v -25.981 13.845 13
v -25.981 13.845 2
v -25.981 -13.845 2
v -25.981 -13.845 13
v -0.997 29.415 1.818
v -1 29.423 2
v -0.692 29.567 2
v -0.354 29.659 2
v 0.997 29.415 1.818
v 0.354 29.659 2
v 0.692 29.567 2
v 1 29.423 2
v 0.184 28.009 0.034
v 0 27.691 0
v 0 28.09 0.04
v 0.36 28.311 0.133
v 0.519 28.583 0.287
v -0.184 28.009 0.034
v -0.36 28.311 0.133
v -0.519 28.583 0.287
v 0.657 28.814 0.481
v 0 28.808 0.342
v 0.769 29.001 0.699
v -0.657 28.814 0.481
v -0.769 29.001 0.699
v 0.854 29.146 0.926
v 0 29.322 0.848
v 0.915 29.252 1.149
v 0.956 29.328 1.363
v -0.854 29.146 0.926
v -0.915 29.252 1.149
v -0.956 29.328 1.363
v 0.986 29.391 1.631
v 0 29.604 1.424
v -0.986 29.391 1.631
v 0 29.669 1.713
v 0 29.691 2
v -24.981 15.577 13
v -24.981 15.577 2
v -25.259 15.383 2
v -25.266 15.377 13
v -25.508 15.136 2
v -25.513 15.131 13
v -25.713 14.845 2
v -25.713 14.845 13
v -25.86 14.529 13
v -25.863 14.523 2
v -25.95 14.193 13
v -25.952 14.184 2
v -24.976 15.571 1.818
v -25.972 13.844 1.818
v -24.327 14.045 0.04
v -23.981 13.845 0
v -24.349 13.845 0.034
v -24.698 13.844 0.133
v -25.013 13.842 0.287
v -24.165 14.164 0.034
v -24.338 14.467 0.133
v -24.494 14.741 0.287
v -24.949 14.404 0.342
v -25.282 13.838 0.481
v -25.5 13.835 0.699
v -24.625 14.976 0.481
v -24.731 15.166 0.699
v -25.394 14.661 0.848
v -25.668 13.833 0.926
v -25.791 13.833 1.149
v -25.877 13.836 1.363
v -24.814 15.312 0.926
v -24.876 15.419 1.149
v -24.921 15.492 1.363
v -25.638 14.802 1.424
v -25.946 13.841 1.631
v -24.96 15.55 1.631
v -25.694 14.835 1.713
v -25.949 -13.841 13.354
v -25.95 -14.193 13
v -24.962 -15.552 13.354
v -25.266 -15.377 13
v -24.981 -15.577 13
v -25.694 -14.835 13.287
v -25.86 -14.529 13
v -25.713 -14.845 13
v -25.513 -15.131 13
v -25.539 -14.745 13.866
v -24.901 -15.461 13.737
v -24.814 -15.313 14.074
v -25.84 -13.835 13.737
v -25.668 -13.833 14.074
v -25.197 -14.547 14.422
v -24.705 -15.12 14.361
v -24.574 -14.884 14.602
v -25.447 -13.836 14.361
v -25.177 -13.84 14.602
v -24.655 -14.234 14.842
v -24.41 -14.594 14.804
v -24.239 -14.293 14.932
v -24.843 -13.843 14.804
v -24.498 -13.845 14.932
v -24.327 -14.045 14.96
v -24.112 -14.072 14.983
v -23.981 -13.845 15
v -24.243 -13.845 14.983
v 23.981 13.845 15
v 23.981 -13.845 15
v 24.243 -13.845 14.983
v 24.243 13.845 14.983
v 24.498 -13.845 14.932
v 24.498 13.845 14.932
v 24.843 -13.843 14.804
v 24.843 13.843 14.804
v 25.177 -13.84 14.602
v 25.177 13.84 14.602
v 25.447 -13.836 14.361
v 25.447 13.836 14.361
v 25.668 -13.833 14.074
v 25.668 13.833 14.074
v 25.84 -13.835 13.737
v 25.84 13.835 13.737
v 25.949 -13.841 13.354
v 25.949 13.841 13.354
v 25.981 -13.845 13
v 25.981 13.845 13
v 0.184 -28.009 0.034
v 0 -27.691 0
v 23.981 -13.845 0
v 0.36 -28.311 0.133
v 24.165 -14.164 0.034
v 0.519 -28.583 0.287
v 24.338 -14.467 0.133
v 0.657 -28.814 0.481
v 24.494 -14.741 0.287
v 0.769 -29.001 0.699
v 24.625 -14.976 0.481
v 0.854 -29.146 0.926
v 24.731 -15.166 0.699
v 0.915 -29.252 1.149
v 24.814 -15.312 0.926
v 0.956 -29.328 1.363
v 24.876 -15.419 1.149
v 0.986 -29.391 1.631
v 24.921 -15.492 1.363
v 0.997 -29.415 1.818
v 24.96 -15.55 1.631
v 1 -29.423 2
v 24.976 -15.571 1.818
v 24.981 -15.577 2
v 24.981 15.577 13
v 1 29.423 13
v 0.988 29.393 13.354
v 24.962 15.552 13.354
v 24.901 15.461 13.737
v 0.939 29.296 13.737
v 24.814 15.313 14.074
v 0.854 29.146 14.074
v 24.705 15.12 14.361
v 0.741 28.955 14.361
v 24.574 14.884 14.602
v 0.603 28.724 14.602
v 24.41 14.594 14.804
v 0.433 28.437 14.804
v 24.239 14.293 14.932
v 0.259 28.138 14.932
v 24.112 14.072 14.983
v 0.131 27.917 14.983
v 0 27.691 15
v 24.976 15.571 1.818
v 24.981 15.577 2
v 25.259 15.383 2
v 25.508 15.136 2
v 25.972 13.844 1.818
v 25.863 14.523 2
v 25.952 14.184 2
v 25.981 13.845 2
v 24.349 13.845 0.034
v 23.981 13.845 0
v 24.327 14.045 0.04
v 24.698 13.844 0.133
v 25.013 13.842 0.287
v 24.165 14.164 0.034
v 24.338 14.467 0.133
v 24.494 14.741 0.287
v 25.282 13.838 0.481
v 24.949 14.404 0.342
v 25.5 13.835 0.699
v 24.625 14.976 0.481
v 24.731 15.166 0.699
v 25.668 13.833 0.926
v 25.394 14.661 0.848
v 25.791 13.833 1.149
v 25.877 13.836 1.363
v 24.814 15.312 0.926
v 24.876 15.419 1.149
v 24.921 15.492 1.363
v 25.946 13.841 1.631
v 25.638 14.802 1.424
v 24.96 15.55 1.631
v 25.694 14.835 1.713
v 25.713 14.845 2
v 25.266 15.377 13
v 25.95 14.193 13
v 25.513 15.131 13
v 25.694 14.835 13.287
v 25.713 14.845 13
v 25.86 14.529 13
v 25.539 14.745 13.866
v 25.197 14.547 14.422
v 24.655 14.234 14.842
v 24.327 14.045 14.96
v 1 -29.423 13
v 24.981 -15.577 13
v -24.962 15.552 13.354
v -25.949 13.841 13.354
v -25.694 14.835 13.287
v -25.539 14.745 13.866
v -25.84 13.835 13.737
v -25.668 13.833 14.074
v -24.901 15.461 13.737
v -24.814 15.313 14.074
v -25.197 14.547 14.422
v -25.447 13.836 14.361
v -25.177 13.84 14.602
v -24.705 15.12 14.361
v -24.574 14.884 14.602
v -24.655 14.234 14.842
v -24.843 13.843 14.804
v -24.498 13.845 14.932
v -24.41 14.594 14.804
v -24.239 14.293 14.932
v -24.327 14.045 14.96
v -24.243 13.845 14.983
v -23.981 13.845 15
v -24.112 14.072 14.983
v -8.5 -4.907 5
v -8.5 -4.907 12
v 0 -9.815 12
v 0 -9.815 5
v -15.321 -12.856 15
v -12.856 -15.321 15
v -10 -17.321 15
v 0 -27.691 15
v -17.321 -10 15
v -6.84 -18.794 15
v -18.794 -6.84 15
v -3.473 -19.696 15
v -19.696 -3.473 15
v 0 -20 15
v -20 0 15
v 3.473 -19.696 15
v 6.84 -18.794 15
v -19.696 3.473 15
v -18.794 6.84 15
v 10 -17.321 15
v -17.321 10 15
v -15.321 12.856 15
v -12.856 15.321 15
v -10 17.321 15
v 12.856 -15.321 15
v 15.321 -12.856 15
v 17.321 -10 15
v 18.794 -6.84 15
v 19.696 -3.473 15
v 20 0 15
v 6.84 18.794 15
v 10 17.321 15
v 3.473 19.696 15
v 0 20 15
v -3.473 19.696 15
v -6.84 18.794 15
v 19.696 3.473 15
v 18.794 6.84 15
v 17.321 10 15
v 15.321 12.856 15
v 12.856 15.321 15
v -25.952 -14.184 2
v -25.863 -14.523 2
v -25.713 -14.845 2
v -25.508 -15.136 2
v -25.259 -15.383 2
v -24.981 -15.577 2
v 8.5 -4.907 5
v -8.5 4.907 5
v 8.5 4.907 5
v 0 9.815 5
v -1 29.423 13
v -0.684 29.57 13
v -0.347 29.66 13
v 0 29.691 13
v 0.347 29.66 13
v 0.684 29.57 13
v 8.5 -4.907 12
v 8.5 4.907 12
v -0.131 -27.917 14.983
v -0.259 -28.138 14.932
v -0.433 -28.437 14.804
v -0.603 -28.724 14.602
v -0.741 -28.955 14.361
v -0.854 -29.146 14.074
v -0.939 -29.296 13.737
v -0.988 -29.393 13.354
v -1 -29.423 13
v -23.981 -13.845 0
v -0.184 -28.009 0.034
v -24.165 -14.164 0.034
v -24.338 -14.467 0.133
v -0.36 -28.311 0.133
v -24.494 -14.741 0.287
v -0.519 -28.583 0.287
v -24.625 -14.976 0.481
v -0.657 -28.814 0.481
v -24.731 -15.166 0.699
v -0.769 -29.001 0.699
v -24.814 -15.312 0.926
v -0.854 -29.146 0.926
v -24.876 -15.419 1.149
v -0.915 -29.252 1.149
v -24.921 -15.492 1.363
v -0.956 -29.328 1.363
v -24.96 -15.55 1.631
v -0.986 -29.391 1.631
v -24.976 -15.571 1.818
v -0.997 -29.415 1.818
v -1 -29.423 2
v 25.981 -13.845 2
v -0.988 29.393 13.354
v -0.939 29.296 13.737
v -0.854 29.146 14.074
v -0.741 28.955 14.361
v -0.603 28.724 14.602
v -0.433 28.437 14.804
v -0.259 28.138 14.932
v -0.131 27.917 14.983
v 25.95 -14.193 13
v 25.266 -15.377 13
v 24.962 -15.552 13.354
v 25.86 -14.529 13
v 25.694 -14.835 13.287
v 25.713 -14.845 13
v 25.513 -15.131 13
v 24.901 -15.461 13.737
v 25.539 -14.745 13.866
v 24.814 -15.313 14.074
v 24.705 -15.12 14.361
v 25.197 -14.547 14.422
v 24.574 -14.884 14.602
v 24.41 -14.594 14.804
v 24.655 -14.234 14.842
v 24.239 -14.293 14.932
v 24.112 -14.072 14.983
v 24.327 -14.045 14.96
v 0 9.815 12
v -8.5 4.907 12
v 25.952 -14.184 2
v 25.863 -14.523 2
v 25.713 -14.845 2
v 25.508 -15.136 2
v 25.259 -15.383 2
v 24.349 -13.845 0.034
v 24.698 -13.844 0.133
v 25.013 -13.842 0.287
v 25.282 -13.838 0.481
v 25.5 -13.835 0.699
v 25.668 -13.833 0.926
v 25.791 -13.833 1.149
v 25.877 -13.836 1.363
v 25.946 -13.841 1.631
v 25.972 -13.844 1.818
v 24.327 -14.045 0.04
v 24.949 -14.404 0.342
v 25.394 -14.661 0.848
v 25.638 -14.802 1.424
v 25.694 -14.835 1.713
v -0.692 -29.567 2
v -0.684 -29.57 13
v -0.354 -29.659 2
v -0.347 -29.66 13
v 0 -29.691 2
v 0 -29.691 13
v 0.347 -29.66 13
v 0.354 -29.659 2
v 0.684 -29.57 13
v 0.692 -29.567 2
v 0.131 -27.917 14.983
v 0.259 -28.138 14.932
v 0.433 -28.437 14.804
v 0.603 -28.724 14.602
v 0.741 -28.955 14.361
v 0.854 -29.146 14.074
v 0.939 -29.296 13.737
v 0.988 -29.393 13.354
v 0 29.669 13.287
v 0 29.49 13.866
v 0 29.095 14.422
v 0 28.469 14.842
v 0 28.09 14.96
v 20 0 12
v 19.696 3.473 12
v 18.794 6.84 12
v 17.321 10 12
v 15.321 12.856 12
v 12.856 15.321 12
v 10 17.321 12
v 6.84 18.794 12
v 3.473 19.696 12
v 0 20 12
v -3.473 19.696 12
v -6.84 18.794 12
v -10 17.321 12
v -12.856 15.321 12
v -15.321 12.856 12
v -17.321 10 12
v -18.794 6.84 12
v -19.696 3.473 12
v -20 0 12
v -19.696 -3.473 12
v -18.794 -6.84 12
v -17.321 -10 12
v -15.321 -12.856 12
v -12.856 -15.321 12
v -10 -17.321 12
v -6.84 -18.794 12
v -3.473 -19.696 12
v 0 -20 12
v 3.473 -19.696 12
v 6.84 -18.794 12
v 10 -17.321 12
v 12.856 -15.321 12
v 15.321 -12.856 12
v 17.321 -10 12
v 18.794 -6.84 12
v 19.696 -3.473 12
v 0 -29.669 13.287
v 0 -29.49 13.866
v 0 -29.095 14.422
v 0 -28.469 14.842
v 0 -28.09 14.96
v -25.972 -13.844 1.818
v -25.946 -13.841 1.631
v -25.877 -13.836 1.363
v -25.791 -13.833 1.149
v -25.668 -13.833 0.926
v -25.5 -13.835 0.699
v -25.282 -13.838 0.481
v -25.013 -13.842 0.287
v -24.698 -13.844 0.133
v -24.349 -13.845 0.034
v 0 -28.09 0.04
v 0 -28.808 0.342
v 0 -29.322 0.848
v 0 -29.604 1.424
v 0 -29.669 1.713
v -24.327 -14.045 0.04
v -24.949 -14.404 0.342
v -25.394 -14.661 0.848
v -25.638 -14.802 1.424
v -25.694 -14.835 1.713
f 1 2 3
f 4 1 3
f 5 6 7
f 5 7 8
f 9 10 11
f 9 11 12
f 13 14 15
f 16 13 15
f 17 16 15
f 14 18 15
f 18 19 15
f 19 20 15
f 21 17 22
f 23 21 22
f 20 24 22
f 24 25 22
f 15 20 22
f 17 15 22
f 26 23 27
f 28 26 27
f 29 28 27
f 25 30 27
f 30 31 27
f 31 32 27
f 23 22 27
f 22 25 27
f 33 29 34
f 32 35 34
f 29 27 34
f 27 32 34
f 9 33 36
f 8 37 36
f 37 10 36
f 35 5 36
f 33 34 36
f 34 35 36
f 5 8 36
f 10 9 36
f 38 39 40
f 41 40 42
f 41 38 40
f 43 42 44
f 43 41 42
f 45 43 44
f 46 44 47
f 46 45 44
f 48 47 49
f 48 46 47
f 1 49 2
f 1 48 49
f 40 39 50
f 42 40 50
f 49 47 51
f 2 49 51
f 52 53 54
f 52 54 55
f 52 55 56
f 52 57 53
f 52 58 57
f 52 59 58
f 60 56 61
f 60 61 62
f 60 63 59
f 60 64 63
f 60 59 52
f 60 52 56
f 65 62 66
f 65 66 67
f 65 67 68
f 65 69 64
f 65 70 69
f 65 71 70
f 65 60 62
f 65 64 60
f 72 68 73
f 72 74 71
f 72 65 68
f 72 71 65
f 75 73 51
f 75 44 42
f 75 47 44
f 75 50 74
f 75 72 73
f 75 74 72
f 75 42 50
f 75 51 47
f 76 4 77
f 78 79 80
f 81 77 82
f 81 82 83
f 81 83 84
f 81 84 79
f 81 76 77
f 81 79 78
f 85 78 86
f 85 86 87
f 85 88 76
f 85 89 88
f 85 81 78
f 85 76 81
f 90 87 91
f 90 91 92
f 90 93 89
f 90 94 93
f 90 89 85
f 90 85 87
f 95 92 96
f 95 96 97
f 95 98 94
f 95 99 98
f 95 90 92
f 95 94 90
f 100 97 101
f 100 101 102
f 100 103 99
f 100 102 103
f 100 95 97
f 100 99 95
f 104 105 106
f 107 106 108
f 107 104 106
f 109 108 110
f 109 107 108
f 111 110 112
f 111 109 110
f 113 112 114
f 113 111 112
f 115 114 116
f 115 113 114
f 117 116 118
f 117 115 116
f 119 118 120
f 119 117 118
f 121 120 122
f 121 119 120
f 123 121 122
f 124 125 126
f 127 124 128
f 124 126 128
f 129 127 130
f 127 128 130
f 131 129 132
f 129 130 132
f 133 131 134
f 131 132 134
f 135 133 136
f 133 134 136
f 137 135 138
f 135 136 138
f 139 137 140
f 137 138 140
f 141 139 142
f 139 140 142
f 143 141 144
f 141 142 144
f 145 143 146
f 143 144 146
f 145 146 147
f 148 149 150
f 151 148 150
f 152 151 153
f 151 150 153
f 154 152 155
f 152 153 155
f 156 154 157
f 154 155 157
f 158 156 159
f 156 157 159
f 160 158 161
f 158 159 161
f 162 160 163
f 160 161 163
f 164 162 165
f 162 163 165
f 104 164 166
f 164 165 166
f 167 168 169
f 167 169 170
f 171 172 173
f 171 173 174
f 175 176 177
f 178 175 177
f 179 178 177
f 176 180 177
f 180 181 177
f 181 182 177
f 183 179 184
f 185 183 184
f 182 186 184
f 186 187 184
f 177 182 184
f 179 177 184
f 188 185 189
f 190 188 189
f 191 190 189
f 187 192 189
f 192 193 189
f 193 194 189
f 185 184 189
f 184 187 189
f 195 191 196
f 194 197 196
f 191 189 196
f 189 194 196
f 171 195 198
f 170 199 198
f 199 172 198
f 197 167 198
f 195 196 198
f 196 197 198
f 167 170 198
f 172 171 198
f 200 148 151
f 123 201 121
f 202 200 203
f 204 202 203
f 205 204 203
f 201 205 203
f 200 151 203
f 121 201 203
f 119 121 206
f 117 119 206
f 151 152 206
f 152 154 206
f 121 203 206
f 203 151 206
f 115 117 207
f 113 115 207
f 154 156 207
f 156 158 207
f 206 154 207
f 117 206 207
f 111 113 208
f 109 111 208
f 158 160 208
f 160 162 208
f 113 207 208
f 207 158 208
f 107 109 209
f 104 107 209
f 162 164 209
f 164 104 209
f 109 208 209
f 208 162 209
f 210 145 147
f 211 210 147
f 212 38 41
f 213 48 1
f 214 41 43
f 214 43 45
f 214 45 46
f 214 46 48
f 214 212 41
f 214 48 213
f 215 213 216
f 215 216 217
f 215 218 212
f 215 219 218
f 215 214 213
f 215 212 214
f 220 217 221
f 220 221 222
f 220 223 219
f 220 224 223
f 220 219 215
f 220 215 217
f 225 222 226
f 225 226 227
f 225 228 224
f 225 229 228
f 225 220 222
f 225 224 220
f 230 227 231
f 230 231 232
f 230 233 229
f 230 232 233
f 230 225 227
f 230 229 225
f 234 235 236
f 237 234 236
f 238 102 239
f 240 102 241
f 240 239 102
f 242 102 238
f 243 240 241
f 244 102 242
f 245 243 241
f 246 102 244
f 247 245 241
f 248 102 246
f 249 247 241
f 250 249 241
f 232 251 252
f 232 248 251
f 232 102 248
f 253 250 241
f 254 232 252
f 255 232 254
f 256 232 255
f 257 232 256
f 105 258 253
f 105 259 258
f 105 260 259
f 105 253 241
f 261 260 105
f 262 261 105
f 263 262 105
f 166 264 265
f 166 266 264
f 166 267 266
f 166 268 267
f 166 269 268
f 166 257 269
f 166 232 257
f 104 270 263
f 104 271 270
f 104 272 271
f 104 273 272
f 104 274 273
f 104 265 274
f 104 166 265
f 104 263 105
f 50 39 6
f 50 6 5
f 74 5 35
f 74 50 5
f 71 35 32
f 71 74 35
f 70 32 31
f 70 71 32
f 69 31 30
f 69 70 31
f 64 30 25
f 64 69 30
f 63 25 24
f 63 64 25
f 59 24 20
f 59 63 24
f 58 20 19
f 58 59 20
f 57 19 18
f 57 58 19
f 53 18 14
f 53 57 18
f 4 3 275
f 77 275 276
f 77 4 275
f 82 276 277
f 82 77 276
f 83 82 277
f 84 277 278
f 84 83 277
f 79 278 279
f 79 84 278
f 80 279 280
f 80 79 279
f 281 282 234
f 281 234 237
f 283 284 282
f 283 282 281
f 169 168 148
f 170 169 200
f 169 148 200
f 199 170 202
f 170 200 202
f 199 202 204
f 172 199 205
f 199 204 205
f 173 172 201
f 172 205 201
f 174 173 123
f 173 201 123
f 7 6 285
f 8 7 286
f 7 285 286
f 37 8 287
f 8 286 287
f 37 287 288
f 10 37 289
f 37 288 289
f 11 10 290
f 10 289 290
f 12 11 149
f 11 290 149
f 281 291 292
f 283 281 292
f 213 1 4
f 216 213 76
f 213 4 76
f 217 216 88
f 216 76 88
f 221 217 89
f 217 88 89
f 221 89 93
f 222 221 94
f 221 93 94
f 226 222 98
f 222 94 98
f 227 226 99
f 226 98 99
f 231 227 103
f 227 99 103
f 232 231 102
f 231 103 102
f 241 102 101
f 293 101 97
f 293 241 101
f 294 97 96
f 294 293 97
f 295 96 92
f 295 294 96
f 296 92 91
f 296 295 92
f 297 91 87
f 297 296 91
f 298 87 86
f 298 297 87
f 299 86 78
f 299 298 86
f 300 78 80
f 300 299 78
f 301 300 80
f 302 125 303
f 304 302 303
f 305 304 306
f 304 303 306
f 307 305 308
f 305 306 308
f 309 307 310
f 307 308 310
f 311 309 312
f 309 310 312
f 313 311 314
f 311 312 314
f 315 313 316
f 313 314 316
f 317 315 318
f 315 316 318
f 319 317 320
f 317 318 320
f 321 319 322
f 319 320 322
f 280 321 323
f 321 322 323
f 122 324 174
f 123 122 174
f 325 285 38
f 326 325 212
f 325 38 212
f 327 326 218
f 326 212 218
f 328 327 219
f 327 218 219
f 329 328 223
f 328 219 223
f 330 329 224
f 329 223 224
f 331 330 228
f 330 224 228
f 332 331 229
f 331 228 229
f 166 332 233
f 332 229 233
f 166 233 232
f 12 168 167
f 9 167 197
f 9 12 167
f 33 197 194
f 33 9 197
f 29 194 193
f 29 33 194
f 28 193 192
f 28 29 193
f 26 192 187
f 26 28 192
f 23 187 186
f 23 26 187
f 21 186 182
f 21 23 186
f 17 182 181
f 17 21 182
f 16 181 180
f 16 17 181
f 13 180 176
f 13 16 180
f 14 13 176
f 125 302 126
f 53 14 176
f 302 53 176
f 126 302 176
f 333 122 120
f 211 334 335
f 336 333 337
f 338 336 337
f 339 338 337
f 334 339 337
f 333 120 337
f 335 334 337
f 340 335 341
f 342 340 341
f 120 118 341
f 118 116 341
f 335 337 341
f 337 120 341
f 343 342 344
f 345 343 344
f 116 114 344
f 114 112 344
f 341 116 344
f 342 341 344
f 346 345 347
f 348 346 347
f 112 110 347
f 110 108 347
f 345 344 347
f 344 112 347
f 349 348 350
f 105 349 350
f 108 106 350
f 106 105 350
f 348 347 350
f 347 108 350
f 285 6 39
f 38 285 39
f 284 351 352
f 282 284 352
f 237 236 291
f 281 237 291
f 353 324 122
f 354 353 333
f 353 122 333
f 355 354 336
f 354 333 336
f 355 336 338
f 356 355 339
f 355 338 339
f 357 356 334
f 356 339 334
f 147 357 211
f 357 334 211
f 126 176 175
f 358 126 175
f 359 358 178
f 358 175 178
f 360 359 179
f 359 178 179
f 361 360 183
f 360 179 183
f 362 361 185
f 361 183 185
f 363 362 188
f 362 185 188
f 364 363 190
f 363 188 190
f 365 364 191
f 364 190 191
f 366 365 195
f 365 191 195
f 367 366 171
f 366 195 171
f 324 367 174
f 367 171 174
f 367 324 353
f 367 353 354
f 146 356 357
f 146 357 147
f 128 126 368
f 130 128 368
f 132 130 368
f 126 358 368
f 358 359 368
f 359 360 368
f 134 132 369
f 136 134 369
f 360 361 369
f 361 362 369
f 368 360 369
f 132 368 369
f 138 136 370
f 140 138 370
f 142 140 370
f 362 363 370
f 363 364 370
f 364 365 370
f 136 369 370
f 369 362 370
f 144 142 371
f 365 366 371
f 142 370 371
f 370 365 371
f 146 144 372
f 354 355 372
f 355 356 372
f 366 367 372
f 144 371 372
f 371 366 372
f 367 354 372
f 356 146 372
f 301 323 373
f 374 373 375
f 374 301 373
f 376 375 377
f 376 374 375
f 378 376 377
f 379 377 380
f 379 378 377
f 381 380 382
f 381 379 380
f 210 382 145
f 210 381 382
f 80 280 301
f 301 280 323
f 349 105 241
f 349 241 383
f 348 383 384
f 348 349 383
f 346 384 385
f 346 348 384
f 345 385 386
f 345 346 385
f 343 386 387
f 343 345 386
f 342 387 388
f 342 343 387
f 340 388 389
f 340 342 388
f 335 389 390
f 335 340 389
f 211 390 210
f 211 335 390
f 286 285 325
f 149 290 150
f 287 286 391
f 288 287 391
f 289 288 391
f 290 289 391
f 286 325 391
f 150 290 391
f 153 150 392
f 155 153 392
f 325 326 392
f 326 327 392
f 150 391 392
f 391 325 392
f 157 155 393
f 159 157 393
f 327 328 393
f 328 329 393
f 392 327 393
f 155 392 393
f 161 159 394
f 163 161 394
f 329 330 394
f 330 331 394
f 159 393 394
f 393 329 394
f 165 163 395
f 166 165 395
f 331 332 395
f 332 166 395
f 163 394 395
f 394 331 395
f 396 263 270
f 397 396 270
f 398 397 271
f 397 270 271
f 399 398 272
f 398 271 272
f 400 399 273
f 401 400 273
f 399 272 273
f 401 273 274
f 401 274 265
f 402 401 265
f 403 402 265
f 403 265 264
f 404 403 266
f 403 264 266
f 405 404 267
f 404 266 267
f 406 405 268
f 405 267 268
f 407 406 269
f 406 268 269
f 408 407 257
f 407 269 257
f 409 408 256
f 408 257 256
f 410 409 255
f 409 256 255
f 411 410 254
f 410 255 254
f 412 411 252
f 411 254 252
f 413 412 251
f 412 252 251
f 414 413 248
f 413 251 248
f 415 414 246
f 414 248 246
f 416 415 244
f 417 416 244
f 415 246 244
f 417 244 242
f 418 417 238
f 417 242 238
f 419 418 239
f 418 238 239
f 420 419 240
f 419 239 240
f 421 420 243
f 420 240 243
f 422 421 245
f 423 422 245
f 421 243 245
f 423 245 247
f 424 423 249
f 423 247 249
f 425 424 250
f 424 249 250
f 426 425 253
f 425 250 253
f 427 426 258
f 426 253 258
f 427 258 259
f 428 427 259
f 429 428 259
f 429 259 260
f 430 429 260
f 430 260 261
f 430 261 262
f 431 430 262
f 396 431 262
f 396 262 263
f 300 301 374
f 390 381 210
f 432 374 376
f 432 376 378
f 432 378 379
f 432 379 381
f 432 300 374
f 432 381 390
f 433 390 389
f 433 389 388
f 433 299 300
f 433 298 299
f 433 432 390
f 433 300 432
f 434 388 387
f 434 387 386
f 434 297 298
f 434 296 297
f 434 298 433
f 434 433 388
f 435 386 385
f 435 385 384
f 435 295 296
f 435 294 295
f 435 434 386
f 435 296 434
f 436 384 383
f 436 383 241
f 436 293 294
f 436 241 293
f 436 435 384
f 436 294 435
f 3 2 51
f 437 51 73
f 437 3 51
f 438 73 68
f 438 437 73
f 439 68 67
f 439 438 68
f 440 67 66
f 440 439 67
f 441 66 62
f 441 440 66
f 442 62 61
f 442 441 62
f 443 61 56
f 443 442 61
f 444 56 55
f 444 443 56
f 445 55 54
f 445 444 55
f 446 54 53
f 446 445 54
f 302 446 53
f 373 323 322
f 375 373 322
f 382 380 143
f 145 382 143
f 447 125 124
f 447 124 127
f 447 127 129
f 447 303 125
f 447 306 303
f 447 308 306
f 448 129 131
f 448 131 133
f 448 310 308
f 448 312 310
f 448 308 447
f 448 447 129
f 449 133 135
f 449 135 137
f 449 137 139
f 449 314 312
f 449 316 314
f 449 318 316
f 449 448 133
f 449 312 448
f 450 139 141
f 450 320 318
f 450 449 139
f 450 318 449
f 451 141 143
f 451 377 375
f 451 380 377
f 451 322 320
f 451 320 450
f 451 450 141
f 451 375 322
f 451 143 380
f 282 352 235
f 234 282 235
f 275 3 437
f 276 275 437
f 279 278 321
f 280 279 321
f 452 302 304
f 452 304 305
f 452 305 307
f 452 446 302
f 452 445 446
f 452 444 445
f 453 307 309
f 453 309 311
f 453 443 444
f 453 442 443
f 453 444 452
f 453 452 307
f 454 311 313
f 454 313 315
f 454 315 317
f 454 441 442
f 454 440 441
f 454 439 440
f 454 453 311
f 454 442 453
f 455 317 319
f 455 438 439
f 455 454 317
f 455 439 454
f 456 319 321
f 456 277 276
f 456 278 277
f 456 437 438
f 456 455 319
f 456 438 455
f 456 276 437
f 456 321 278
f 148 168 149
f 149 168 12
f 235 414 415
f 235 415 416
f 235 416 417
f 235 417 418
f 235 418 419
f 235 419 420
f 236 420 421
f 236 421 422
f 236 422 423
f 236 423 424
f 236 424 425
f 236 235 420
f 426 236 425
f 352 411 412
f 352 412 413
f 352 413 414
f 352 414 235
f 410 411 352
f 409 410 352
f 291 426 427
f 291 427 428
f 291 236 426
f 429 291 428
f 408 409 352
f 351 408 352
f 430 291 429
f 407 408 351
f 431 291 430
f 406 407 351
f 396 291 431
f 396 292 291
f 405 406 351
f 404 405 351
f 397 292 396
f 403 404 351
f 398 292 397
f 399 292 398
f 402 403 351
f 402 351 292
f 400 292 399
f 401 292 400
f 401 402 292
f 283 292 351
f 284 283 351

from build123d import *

# Parameters (mm, degrees)
PAD_DEPTH       = 15
SKETCH002_R     = 20
POCKET_DEPTH    = 3
POCKET001_DEPTH = 7
FILLET_R        = 2
FILLET001_R     = 2


with BuildPart() as part:
    # Sketch → Pad (new body)
    with BuildSketch(Plane.XY):
        Polygon((0, 30), (-25.980762, 15), (-25.980762, -15), (0, -30), (25.980762, -15), (25.980762, 15), align=None)
    extrude(amount=PAD_DEPTH)

    # Sketch002 (on Face8 of Pad) → Pocket (cut)
    with BuildSketch(Plane.XY.offset(15)):
        Circle(SKETCH002_R)
    extrude(amount=-POCKET_DEPTH, mode=Mode.SUBTRACT)

    # Sketch003 (on Face10 of Pocket) → Pocket001 (cut)
    with BuildSketch(Plane.XY.offset(12)):
        Polygon((0, 9.814955), (-8.5, 4.907477), (-8.5, -4.907477), (0, -9.814955), (8.5, -4.907477), (8.5, 4.907477), align=None)
    extrude(amount=-POCKET001_DEPTH, mode=Mode.SUBTRACT)

    # Fillet
    fillet_edges = [part.edges().sort_by_distance(p)[0] for p in [
        (25.980762, 0, 15),
        (12.990381, -22.5, 15),
        (-12.990381, -22.5, 15),
        (-25.980762, 0, 15),
        (-12.990381, 22.5, 15),
        (12.990381, 22.5, 15),
        (25.980762, 0, 0),
        (12.990381, -22.5, 0),
        (-12.990381, -22.5, 0),
        (12.990381, 22.5, 0),
        (-12.990381, 22.5, 0),
        (-25.980762, 0, 0),
    ]]
    fillet(fillet_edges, radius=FILLET_R)

    # Fillet001
    fillet001_edges = [part.edges().sort_by_distance(p)[0] for p in [
        (0, 30, 7.5),
        (-25.980762, 15, 7.5),
        (-25.980762, -15, 7.5),
        (0, -30, 7.5),
        (25.980762, -15, 7.5),
        (25.980762, 15, 7.5),
    ]]
    fillet(fillet001_edges, radius=FILLET001_R)


solid = part.part
